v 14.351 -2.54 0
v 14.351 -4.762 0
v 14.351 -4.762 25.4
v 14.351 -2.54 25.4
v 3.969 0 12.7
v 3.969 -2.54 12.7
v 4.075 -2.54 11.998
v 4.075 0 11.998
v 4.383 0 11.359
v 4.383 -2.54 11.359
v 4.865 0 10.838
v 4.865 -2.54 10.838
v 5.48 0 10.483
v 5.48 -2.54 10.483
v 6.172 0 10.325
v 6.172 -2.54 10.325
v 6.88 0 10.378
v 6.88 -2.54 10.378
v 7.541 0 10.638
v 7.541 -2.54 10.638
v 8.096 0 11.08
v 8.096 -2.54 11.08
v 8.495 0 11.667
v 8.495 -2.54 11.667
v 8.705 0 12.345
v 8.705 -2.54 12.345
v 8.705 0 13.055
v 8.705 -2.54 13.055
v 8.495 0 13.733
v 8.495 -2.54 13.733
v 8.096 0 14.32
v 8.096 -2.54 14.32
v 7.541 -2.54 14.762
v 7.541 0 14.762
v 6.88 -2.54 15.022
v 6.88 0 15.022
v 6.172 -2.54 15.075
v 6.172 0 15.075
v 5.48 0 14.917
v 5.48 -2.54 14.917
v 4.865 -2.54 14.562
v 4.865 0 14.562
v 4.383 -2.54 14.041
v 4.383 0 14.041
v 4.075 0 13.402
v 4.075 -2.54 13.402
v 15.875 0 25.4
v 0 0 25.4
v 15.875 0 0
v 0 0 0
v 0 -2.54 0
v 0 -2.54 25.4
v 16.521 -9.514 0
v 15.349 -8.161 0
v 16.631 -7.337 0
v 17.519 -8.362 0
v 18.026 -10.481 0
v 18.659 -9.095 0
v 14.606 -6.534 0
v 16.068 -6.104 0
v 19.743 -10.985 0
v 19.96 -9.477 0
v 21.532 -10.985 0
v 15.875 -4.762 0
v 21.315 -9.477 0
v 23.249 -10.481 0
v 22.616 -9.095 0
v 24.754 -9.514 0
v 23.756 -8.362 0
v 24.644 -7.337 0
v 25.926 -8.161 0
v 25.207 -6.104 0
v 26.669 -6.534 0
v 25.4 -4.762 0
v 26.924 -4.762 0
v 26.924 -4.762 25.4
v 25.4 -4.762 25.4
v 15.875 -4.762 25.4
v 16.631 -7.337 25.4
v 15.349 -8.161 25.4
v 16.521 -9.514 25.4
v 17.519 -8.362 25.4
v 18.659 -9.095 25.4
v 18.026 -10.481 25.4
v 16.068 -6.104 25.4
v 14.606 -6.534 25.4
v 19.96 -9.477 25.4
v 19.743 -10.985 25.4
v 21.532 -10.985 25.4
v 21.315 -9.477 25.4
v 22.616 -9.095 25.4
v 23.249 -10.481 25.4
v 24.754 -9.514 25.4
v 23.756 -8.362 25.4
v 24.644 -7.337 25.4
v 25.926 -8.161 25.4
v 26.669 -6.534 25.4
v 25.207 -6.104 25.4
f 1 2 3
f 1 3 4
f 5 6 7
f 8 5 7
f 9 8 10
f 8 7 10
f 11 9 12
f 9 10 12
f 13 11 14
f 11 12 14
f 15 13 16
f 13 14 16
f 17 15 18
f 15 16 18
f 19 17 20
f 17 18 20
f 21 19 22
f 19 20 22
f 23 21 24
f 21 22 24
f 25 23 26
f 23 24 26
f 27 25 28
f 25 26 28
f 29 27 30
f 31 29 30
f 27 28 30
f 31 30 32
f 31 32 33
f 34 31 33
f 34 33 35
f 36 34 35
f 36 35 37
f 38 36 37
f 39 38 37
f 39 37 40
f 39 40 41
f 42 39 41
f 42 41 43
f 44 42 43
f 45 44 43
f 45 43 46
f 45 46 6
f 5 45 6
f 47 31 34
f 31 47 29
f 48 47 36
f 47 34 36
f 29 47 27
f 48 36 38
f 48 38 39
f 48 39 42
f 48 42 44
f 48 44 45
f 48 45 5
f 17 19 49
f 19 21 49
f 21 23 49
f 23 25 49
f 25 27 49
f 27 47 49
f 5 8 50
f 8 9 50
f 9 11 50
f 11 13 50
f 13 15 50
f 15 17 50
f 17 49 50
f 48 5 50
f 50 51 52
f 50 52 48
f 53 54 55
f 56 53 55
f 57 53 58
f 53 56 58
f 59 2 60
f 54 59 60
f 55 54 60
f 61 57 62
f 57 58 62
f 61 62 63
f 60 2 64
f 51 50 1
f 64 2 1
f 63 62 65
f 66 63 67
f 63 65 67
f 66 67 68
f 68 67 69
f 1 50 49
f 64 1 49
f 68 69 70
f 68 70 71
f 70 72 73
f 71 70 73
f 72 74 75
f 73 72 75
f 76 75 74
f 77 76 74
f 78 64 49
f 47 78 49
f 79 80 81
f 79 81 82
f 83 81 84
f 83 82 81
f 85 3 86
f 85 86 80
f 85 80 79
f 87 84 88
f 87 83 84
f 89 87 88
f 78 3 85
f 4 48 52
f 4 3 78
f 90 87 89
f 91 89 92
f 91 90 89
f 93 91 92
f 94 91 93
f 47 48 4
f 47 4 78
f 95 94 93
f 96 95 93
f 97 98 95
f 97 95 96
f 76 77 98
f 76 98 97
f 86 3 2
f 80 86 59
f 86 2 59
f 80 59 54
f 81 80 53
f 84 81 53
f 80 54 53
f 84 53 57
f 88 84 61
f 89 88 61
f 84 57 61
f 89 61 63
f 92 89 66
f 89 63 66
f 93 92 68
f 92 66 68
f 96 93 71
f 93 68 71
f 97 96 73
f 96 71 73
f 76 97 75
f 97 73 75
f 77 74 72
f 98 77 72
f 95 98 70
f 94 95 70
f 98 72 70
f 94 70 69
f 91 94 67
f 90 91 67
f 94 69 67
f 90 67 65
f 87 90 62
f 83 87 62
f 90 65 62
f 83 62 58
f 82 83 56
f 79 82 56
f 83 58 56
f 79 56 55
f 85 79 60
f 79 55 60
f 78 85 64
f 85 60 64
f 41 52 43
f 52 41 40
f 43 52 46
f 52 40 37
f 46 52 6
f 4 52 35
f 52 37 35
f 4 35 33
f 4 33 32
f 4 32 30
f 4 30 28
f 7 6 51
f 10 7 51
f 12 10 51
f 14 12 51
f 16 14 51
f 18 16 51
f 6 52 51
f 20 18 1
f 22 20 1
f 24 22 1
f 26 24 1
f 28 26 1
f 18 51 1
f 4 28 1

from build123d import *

# Parameters (mm, degrees)
F0_W     = 14.351
F0_H     = 2.54
F0_W_2   = 1.524
F0_H_2   = 2.2225
F1_DEPTH = 25.4
F3_DEPTH = 25.4


with BuildPart() as f1:
    # F0 (on Top) → F1 (new body)
    with BuildSketch(Plane.XY):
        with Locations((7.1755, -1.27)):
            Rectangle(F0_W, F0_H)
        with Locations((15.113, -1.27)):
            Rectangle(F0_W_2, F0_H)
        with Locations((15.113, -3.65125)):
            Rectangle(F0_W_2, F0_H_2)
        with BuildLine():
            Line((15.875, -4.7625), (14.351, -4.7625))
            ThreePointArc((14.351, -4.7625), (20.6375, -11.049), (26.924, -4.7625))
            Line((26.924, -4.7625), (25.4, -4.7625))
            ThreePointArc((25.4, -4.7625), (20.6375, -9.525), (15.875, -4.7625))
        make_face()
    extrude(amount=F1_DEPTH)

    # F2 (on face) → F3 (cut)
    with BuildSketch(Plane.XZ.offset(2.54)):
        with BuildLine():
            ThreePointArc((8.73125, 12.7), (6.35, 15.08125), (3.96875, 12.7))
            ThreePointArc((3.96875, 12.7), (6.35, 10.31875), (8.73125, 12.7))
        make_face()
    extrude(amount=-F3_DEPTH, mode=Mode.SUBTRACT)


solid = f1.part
